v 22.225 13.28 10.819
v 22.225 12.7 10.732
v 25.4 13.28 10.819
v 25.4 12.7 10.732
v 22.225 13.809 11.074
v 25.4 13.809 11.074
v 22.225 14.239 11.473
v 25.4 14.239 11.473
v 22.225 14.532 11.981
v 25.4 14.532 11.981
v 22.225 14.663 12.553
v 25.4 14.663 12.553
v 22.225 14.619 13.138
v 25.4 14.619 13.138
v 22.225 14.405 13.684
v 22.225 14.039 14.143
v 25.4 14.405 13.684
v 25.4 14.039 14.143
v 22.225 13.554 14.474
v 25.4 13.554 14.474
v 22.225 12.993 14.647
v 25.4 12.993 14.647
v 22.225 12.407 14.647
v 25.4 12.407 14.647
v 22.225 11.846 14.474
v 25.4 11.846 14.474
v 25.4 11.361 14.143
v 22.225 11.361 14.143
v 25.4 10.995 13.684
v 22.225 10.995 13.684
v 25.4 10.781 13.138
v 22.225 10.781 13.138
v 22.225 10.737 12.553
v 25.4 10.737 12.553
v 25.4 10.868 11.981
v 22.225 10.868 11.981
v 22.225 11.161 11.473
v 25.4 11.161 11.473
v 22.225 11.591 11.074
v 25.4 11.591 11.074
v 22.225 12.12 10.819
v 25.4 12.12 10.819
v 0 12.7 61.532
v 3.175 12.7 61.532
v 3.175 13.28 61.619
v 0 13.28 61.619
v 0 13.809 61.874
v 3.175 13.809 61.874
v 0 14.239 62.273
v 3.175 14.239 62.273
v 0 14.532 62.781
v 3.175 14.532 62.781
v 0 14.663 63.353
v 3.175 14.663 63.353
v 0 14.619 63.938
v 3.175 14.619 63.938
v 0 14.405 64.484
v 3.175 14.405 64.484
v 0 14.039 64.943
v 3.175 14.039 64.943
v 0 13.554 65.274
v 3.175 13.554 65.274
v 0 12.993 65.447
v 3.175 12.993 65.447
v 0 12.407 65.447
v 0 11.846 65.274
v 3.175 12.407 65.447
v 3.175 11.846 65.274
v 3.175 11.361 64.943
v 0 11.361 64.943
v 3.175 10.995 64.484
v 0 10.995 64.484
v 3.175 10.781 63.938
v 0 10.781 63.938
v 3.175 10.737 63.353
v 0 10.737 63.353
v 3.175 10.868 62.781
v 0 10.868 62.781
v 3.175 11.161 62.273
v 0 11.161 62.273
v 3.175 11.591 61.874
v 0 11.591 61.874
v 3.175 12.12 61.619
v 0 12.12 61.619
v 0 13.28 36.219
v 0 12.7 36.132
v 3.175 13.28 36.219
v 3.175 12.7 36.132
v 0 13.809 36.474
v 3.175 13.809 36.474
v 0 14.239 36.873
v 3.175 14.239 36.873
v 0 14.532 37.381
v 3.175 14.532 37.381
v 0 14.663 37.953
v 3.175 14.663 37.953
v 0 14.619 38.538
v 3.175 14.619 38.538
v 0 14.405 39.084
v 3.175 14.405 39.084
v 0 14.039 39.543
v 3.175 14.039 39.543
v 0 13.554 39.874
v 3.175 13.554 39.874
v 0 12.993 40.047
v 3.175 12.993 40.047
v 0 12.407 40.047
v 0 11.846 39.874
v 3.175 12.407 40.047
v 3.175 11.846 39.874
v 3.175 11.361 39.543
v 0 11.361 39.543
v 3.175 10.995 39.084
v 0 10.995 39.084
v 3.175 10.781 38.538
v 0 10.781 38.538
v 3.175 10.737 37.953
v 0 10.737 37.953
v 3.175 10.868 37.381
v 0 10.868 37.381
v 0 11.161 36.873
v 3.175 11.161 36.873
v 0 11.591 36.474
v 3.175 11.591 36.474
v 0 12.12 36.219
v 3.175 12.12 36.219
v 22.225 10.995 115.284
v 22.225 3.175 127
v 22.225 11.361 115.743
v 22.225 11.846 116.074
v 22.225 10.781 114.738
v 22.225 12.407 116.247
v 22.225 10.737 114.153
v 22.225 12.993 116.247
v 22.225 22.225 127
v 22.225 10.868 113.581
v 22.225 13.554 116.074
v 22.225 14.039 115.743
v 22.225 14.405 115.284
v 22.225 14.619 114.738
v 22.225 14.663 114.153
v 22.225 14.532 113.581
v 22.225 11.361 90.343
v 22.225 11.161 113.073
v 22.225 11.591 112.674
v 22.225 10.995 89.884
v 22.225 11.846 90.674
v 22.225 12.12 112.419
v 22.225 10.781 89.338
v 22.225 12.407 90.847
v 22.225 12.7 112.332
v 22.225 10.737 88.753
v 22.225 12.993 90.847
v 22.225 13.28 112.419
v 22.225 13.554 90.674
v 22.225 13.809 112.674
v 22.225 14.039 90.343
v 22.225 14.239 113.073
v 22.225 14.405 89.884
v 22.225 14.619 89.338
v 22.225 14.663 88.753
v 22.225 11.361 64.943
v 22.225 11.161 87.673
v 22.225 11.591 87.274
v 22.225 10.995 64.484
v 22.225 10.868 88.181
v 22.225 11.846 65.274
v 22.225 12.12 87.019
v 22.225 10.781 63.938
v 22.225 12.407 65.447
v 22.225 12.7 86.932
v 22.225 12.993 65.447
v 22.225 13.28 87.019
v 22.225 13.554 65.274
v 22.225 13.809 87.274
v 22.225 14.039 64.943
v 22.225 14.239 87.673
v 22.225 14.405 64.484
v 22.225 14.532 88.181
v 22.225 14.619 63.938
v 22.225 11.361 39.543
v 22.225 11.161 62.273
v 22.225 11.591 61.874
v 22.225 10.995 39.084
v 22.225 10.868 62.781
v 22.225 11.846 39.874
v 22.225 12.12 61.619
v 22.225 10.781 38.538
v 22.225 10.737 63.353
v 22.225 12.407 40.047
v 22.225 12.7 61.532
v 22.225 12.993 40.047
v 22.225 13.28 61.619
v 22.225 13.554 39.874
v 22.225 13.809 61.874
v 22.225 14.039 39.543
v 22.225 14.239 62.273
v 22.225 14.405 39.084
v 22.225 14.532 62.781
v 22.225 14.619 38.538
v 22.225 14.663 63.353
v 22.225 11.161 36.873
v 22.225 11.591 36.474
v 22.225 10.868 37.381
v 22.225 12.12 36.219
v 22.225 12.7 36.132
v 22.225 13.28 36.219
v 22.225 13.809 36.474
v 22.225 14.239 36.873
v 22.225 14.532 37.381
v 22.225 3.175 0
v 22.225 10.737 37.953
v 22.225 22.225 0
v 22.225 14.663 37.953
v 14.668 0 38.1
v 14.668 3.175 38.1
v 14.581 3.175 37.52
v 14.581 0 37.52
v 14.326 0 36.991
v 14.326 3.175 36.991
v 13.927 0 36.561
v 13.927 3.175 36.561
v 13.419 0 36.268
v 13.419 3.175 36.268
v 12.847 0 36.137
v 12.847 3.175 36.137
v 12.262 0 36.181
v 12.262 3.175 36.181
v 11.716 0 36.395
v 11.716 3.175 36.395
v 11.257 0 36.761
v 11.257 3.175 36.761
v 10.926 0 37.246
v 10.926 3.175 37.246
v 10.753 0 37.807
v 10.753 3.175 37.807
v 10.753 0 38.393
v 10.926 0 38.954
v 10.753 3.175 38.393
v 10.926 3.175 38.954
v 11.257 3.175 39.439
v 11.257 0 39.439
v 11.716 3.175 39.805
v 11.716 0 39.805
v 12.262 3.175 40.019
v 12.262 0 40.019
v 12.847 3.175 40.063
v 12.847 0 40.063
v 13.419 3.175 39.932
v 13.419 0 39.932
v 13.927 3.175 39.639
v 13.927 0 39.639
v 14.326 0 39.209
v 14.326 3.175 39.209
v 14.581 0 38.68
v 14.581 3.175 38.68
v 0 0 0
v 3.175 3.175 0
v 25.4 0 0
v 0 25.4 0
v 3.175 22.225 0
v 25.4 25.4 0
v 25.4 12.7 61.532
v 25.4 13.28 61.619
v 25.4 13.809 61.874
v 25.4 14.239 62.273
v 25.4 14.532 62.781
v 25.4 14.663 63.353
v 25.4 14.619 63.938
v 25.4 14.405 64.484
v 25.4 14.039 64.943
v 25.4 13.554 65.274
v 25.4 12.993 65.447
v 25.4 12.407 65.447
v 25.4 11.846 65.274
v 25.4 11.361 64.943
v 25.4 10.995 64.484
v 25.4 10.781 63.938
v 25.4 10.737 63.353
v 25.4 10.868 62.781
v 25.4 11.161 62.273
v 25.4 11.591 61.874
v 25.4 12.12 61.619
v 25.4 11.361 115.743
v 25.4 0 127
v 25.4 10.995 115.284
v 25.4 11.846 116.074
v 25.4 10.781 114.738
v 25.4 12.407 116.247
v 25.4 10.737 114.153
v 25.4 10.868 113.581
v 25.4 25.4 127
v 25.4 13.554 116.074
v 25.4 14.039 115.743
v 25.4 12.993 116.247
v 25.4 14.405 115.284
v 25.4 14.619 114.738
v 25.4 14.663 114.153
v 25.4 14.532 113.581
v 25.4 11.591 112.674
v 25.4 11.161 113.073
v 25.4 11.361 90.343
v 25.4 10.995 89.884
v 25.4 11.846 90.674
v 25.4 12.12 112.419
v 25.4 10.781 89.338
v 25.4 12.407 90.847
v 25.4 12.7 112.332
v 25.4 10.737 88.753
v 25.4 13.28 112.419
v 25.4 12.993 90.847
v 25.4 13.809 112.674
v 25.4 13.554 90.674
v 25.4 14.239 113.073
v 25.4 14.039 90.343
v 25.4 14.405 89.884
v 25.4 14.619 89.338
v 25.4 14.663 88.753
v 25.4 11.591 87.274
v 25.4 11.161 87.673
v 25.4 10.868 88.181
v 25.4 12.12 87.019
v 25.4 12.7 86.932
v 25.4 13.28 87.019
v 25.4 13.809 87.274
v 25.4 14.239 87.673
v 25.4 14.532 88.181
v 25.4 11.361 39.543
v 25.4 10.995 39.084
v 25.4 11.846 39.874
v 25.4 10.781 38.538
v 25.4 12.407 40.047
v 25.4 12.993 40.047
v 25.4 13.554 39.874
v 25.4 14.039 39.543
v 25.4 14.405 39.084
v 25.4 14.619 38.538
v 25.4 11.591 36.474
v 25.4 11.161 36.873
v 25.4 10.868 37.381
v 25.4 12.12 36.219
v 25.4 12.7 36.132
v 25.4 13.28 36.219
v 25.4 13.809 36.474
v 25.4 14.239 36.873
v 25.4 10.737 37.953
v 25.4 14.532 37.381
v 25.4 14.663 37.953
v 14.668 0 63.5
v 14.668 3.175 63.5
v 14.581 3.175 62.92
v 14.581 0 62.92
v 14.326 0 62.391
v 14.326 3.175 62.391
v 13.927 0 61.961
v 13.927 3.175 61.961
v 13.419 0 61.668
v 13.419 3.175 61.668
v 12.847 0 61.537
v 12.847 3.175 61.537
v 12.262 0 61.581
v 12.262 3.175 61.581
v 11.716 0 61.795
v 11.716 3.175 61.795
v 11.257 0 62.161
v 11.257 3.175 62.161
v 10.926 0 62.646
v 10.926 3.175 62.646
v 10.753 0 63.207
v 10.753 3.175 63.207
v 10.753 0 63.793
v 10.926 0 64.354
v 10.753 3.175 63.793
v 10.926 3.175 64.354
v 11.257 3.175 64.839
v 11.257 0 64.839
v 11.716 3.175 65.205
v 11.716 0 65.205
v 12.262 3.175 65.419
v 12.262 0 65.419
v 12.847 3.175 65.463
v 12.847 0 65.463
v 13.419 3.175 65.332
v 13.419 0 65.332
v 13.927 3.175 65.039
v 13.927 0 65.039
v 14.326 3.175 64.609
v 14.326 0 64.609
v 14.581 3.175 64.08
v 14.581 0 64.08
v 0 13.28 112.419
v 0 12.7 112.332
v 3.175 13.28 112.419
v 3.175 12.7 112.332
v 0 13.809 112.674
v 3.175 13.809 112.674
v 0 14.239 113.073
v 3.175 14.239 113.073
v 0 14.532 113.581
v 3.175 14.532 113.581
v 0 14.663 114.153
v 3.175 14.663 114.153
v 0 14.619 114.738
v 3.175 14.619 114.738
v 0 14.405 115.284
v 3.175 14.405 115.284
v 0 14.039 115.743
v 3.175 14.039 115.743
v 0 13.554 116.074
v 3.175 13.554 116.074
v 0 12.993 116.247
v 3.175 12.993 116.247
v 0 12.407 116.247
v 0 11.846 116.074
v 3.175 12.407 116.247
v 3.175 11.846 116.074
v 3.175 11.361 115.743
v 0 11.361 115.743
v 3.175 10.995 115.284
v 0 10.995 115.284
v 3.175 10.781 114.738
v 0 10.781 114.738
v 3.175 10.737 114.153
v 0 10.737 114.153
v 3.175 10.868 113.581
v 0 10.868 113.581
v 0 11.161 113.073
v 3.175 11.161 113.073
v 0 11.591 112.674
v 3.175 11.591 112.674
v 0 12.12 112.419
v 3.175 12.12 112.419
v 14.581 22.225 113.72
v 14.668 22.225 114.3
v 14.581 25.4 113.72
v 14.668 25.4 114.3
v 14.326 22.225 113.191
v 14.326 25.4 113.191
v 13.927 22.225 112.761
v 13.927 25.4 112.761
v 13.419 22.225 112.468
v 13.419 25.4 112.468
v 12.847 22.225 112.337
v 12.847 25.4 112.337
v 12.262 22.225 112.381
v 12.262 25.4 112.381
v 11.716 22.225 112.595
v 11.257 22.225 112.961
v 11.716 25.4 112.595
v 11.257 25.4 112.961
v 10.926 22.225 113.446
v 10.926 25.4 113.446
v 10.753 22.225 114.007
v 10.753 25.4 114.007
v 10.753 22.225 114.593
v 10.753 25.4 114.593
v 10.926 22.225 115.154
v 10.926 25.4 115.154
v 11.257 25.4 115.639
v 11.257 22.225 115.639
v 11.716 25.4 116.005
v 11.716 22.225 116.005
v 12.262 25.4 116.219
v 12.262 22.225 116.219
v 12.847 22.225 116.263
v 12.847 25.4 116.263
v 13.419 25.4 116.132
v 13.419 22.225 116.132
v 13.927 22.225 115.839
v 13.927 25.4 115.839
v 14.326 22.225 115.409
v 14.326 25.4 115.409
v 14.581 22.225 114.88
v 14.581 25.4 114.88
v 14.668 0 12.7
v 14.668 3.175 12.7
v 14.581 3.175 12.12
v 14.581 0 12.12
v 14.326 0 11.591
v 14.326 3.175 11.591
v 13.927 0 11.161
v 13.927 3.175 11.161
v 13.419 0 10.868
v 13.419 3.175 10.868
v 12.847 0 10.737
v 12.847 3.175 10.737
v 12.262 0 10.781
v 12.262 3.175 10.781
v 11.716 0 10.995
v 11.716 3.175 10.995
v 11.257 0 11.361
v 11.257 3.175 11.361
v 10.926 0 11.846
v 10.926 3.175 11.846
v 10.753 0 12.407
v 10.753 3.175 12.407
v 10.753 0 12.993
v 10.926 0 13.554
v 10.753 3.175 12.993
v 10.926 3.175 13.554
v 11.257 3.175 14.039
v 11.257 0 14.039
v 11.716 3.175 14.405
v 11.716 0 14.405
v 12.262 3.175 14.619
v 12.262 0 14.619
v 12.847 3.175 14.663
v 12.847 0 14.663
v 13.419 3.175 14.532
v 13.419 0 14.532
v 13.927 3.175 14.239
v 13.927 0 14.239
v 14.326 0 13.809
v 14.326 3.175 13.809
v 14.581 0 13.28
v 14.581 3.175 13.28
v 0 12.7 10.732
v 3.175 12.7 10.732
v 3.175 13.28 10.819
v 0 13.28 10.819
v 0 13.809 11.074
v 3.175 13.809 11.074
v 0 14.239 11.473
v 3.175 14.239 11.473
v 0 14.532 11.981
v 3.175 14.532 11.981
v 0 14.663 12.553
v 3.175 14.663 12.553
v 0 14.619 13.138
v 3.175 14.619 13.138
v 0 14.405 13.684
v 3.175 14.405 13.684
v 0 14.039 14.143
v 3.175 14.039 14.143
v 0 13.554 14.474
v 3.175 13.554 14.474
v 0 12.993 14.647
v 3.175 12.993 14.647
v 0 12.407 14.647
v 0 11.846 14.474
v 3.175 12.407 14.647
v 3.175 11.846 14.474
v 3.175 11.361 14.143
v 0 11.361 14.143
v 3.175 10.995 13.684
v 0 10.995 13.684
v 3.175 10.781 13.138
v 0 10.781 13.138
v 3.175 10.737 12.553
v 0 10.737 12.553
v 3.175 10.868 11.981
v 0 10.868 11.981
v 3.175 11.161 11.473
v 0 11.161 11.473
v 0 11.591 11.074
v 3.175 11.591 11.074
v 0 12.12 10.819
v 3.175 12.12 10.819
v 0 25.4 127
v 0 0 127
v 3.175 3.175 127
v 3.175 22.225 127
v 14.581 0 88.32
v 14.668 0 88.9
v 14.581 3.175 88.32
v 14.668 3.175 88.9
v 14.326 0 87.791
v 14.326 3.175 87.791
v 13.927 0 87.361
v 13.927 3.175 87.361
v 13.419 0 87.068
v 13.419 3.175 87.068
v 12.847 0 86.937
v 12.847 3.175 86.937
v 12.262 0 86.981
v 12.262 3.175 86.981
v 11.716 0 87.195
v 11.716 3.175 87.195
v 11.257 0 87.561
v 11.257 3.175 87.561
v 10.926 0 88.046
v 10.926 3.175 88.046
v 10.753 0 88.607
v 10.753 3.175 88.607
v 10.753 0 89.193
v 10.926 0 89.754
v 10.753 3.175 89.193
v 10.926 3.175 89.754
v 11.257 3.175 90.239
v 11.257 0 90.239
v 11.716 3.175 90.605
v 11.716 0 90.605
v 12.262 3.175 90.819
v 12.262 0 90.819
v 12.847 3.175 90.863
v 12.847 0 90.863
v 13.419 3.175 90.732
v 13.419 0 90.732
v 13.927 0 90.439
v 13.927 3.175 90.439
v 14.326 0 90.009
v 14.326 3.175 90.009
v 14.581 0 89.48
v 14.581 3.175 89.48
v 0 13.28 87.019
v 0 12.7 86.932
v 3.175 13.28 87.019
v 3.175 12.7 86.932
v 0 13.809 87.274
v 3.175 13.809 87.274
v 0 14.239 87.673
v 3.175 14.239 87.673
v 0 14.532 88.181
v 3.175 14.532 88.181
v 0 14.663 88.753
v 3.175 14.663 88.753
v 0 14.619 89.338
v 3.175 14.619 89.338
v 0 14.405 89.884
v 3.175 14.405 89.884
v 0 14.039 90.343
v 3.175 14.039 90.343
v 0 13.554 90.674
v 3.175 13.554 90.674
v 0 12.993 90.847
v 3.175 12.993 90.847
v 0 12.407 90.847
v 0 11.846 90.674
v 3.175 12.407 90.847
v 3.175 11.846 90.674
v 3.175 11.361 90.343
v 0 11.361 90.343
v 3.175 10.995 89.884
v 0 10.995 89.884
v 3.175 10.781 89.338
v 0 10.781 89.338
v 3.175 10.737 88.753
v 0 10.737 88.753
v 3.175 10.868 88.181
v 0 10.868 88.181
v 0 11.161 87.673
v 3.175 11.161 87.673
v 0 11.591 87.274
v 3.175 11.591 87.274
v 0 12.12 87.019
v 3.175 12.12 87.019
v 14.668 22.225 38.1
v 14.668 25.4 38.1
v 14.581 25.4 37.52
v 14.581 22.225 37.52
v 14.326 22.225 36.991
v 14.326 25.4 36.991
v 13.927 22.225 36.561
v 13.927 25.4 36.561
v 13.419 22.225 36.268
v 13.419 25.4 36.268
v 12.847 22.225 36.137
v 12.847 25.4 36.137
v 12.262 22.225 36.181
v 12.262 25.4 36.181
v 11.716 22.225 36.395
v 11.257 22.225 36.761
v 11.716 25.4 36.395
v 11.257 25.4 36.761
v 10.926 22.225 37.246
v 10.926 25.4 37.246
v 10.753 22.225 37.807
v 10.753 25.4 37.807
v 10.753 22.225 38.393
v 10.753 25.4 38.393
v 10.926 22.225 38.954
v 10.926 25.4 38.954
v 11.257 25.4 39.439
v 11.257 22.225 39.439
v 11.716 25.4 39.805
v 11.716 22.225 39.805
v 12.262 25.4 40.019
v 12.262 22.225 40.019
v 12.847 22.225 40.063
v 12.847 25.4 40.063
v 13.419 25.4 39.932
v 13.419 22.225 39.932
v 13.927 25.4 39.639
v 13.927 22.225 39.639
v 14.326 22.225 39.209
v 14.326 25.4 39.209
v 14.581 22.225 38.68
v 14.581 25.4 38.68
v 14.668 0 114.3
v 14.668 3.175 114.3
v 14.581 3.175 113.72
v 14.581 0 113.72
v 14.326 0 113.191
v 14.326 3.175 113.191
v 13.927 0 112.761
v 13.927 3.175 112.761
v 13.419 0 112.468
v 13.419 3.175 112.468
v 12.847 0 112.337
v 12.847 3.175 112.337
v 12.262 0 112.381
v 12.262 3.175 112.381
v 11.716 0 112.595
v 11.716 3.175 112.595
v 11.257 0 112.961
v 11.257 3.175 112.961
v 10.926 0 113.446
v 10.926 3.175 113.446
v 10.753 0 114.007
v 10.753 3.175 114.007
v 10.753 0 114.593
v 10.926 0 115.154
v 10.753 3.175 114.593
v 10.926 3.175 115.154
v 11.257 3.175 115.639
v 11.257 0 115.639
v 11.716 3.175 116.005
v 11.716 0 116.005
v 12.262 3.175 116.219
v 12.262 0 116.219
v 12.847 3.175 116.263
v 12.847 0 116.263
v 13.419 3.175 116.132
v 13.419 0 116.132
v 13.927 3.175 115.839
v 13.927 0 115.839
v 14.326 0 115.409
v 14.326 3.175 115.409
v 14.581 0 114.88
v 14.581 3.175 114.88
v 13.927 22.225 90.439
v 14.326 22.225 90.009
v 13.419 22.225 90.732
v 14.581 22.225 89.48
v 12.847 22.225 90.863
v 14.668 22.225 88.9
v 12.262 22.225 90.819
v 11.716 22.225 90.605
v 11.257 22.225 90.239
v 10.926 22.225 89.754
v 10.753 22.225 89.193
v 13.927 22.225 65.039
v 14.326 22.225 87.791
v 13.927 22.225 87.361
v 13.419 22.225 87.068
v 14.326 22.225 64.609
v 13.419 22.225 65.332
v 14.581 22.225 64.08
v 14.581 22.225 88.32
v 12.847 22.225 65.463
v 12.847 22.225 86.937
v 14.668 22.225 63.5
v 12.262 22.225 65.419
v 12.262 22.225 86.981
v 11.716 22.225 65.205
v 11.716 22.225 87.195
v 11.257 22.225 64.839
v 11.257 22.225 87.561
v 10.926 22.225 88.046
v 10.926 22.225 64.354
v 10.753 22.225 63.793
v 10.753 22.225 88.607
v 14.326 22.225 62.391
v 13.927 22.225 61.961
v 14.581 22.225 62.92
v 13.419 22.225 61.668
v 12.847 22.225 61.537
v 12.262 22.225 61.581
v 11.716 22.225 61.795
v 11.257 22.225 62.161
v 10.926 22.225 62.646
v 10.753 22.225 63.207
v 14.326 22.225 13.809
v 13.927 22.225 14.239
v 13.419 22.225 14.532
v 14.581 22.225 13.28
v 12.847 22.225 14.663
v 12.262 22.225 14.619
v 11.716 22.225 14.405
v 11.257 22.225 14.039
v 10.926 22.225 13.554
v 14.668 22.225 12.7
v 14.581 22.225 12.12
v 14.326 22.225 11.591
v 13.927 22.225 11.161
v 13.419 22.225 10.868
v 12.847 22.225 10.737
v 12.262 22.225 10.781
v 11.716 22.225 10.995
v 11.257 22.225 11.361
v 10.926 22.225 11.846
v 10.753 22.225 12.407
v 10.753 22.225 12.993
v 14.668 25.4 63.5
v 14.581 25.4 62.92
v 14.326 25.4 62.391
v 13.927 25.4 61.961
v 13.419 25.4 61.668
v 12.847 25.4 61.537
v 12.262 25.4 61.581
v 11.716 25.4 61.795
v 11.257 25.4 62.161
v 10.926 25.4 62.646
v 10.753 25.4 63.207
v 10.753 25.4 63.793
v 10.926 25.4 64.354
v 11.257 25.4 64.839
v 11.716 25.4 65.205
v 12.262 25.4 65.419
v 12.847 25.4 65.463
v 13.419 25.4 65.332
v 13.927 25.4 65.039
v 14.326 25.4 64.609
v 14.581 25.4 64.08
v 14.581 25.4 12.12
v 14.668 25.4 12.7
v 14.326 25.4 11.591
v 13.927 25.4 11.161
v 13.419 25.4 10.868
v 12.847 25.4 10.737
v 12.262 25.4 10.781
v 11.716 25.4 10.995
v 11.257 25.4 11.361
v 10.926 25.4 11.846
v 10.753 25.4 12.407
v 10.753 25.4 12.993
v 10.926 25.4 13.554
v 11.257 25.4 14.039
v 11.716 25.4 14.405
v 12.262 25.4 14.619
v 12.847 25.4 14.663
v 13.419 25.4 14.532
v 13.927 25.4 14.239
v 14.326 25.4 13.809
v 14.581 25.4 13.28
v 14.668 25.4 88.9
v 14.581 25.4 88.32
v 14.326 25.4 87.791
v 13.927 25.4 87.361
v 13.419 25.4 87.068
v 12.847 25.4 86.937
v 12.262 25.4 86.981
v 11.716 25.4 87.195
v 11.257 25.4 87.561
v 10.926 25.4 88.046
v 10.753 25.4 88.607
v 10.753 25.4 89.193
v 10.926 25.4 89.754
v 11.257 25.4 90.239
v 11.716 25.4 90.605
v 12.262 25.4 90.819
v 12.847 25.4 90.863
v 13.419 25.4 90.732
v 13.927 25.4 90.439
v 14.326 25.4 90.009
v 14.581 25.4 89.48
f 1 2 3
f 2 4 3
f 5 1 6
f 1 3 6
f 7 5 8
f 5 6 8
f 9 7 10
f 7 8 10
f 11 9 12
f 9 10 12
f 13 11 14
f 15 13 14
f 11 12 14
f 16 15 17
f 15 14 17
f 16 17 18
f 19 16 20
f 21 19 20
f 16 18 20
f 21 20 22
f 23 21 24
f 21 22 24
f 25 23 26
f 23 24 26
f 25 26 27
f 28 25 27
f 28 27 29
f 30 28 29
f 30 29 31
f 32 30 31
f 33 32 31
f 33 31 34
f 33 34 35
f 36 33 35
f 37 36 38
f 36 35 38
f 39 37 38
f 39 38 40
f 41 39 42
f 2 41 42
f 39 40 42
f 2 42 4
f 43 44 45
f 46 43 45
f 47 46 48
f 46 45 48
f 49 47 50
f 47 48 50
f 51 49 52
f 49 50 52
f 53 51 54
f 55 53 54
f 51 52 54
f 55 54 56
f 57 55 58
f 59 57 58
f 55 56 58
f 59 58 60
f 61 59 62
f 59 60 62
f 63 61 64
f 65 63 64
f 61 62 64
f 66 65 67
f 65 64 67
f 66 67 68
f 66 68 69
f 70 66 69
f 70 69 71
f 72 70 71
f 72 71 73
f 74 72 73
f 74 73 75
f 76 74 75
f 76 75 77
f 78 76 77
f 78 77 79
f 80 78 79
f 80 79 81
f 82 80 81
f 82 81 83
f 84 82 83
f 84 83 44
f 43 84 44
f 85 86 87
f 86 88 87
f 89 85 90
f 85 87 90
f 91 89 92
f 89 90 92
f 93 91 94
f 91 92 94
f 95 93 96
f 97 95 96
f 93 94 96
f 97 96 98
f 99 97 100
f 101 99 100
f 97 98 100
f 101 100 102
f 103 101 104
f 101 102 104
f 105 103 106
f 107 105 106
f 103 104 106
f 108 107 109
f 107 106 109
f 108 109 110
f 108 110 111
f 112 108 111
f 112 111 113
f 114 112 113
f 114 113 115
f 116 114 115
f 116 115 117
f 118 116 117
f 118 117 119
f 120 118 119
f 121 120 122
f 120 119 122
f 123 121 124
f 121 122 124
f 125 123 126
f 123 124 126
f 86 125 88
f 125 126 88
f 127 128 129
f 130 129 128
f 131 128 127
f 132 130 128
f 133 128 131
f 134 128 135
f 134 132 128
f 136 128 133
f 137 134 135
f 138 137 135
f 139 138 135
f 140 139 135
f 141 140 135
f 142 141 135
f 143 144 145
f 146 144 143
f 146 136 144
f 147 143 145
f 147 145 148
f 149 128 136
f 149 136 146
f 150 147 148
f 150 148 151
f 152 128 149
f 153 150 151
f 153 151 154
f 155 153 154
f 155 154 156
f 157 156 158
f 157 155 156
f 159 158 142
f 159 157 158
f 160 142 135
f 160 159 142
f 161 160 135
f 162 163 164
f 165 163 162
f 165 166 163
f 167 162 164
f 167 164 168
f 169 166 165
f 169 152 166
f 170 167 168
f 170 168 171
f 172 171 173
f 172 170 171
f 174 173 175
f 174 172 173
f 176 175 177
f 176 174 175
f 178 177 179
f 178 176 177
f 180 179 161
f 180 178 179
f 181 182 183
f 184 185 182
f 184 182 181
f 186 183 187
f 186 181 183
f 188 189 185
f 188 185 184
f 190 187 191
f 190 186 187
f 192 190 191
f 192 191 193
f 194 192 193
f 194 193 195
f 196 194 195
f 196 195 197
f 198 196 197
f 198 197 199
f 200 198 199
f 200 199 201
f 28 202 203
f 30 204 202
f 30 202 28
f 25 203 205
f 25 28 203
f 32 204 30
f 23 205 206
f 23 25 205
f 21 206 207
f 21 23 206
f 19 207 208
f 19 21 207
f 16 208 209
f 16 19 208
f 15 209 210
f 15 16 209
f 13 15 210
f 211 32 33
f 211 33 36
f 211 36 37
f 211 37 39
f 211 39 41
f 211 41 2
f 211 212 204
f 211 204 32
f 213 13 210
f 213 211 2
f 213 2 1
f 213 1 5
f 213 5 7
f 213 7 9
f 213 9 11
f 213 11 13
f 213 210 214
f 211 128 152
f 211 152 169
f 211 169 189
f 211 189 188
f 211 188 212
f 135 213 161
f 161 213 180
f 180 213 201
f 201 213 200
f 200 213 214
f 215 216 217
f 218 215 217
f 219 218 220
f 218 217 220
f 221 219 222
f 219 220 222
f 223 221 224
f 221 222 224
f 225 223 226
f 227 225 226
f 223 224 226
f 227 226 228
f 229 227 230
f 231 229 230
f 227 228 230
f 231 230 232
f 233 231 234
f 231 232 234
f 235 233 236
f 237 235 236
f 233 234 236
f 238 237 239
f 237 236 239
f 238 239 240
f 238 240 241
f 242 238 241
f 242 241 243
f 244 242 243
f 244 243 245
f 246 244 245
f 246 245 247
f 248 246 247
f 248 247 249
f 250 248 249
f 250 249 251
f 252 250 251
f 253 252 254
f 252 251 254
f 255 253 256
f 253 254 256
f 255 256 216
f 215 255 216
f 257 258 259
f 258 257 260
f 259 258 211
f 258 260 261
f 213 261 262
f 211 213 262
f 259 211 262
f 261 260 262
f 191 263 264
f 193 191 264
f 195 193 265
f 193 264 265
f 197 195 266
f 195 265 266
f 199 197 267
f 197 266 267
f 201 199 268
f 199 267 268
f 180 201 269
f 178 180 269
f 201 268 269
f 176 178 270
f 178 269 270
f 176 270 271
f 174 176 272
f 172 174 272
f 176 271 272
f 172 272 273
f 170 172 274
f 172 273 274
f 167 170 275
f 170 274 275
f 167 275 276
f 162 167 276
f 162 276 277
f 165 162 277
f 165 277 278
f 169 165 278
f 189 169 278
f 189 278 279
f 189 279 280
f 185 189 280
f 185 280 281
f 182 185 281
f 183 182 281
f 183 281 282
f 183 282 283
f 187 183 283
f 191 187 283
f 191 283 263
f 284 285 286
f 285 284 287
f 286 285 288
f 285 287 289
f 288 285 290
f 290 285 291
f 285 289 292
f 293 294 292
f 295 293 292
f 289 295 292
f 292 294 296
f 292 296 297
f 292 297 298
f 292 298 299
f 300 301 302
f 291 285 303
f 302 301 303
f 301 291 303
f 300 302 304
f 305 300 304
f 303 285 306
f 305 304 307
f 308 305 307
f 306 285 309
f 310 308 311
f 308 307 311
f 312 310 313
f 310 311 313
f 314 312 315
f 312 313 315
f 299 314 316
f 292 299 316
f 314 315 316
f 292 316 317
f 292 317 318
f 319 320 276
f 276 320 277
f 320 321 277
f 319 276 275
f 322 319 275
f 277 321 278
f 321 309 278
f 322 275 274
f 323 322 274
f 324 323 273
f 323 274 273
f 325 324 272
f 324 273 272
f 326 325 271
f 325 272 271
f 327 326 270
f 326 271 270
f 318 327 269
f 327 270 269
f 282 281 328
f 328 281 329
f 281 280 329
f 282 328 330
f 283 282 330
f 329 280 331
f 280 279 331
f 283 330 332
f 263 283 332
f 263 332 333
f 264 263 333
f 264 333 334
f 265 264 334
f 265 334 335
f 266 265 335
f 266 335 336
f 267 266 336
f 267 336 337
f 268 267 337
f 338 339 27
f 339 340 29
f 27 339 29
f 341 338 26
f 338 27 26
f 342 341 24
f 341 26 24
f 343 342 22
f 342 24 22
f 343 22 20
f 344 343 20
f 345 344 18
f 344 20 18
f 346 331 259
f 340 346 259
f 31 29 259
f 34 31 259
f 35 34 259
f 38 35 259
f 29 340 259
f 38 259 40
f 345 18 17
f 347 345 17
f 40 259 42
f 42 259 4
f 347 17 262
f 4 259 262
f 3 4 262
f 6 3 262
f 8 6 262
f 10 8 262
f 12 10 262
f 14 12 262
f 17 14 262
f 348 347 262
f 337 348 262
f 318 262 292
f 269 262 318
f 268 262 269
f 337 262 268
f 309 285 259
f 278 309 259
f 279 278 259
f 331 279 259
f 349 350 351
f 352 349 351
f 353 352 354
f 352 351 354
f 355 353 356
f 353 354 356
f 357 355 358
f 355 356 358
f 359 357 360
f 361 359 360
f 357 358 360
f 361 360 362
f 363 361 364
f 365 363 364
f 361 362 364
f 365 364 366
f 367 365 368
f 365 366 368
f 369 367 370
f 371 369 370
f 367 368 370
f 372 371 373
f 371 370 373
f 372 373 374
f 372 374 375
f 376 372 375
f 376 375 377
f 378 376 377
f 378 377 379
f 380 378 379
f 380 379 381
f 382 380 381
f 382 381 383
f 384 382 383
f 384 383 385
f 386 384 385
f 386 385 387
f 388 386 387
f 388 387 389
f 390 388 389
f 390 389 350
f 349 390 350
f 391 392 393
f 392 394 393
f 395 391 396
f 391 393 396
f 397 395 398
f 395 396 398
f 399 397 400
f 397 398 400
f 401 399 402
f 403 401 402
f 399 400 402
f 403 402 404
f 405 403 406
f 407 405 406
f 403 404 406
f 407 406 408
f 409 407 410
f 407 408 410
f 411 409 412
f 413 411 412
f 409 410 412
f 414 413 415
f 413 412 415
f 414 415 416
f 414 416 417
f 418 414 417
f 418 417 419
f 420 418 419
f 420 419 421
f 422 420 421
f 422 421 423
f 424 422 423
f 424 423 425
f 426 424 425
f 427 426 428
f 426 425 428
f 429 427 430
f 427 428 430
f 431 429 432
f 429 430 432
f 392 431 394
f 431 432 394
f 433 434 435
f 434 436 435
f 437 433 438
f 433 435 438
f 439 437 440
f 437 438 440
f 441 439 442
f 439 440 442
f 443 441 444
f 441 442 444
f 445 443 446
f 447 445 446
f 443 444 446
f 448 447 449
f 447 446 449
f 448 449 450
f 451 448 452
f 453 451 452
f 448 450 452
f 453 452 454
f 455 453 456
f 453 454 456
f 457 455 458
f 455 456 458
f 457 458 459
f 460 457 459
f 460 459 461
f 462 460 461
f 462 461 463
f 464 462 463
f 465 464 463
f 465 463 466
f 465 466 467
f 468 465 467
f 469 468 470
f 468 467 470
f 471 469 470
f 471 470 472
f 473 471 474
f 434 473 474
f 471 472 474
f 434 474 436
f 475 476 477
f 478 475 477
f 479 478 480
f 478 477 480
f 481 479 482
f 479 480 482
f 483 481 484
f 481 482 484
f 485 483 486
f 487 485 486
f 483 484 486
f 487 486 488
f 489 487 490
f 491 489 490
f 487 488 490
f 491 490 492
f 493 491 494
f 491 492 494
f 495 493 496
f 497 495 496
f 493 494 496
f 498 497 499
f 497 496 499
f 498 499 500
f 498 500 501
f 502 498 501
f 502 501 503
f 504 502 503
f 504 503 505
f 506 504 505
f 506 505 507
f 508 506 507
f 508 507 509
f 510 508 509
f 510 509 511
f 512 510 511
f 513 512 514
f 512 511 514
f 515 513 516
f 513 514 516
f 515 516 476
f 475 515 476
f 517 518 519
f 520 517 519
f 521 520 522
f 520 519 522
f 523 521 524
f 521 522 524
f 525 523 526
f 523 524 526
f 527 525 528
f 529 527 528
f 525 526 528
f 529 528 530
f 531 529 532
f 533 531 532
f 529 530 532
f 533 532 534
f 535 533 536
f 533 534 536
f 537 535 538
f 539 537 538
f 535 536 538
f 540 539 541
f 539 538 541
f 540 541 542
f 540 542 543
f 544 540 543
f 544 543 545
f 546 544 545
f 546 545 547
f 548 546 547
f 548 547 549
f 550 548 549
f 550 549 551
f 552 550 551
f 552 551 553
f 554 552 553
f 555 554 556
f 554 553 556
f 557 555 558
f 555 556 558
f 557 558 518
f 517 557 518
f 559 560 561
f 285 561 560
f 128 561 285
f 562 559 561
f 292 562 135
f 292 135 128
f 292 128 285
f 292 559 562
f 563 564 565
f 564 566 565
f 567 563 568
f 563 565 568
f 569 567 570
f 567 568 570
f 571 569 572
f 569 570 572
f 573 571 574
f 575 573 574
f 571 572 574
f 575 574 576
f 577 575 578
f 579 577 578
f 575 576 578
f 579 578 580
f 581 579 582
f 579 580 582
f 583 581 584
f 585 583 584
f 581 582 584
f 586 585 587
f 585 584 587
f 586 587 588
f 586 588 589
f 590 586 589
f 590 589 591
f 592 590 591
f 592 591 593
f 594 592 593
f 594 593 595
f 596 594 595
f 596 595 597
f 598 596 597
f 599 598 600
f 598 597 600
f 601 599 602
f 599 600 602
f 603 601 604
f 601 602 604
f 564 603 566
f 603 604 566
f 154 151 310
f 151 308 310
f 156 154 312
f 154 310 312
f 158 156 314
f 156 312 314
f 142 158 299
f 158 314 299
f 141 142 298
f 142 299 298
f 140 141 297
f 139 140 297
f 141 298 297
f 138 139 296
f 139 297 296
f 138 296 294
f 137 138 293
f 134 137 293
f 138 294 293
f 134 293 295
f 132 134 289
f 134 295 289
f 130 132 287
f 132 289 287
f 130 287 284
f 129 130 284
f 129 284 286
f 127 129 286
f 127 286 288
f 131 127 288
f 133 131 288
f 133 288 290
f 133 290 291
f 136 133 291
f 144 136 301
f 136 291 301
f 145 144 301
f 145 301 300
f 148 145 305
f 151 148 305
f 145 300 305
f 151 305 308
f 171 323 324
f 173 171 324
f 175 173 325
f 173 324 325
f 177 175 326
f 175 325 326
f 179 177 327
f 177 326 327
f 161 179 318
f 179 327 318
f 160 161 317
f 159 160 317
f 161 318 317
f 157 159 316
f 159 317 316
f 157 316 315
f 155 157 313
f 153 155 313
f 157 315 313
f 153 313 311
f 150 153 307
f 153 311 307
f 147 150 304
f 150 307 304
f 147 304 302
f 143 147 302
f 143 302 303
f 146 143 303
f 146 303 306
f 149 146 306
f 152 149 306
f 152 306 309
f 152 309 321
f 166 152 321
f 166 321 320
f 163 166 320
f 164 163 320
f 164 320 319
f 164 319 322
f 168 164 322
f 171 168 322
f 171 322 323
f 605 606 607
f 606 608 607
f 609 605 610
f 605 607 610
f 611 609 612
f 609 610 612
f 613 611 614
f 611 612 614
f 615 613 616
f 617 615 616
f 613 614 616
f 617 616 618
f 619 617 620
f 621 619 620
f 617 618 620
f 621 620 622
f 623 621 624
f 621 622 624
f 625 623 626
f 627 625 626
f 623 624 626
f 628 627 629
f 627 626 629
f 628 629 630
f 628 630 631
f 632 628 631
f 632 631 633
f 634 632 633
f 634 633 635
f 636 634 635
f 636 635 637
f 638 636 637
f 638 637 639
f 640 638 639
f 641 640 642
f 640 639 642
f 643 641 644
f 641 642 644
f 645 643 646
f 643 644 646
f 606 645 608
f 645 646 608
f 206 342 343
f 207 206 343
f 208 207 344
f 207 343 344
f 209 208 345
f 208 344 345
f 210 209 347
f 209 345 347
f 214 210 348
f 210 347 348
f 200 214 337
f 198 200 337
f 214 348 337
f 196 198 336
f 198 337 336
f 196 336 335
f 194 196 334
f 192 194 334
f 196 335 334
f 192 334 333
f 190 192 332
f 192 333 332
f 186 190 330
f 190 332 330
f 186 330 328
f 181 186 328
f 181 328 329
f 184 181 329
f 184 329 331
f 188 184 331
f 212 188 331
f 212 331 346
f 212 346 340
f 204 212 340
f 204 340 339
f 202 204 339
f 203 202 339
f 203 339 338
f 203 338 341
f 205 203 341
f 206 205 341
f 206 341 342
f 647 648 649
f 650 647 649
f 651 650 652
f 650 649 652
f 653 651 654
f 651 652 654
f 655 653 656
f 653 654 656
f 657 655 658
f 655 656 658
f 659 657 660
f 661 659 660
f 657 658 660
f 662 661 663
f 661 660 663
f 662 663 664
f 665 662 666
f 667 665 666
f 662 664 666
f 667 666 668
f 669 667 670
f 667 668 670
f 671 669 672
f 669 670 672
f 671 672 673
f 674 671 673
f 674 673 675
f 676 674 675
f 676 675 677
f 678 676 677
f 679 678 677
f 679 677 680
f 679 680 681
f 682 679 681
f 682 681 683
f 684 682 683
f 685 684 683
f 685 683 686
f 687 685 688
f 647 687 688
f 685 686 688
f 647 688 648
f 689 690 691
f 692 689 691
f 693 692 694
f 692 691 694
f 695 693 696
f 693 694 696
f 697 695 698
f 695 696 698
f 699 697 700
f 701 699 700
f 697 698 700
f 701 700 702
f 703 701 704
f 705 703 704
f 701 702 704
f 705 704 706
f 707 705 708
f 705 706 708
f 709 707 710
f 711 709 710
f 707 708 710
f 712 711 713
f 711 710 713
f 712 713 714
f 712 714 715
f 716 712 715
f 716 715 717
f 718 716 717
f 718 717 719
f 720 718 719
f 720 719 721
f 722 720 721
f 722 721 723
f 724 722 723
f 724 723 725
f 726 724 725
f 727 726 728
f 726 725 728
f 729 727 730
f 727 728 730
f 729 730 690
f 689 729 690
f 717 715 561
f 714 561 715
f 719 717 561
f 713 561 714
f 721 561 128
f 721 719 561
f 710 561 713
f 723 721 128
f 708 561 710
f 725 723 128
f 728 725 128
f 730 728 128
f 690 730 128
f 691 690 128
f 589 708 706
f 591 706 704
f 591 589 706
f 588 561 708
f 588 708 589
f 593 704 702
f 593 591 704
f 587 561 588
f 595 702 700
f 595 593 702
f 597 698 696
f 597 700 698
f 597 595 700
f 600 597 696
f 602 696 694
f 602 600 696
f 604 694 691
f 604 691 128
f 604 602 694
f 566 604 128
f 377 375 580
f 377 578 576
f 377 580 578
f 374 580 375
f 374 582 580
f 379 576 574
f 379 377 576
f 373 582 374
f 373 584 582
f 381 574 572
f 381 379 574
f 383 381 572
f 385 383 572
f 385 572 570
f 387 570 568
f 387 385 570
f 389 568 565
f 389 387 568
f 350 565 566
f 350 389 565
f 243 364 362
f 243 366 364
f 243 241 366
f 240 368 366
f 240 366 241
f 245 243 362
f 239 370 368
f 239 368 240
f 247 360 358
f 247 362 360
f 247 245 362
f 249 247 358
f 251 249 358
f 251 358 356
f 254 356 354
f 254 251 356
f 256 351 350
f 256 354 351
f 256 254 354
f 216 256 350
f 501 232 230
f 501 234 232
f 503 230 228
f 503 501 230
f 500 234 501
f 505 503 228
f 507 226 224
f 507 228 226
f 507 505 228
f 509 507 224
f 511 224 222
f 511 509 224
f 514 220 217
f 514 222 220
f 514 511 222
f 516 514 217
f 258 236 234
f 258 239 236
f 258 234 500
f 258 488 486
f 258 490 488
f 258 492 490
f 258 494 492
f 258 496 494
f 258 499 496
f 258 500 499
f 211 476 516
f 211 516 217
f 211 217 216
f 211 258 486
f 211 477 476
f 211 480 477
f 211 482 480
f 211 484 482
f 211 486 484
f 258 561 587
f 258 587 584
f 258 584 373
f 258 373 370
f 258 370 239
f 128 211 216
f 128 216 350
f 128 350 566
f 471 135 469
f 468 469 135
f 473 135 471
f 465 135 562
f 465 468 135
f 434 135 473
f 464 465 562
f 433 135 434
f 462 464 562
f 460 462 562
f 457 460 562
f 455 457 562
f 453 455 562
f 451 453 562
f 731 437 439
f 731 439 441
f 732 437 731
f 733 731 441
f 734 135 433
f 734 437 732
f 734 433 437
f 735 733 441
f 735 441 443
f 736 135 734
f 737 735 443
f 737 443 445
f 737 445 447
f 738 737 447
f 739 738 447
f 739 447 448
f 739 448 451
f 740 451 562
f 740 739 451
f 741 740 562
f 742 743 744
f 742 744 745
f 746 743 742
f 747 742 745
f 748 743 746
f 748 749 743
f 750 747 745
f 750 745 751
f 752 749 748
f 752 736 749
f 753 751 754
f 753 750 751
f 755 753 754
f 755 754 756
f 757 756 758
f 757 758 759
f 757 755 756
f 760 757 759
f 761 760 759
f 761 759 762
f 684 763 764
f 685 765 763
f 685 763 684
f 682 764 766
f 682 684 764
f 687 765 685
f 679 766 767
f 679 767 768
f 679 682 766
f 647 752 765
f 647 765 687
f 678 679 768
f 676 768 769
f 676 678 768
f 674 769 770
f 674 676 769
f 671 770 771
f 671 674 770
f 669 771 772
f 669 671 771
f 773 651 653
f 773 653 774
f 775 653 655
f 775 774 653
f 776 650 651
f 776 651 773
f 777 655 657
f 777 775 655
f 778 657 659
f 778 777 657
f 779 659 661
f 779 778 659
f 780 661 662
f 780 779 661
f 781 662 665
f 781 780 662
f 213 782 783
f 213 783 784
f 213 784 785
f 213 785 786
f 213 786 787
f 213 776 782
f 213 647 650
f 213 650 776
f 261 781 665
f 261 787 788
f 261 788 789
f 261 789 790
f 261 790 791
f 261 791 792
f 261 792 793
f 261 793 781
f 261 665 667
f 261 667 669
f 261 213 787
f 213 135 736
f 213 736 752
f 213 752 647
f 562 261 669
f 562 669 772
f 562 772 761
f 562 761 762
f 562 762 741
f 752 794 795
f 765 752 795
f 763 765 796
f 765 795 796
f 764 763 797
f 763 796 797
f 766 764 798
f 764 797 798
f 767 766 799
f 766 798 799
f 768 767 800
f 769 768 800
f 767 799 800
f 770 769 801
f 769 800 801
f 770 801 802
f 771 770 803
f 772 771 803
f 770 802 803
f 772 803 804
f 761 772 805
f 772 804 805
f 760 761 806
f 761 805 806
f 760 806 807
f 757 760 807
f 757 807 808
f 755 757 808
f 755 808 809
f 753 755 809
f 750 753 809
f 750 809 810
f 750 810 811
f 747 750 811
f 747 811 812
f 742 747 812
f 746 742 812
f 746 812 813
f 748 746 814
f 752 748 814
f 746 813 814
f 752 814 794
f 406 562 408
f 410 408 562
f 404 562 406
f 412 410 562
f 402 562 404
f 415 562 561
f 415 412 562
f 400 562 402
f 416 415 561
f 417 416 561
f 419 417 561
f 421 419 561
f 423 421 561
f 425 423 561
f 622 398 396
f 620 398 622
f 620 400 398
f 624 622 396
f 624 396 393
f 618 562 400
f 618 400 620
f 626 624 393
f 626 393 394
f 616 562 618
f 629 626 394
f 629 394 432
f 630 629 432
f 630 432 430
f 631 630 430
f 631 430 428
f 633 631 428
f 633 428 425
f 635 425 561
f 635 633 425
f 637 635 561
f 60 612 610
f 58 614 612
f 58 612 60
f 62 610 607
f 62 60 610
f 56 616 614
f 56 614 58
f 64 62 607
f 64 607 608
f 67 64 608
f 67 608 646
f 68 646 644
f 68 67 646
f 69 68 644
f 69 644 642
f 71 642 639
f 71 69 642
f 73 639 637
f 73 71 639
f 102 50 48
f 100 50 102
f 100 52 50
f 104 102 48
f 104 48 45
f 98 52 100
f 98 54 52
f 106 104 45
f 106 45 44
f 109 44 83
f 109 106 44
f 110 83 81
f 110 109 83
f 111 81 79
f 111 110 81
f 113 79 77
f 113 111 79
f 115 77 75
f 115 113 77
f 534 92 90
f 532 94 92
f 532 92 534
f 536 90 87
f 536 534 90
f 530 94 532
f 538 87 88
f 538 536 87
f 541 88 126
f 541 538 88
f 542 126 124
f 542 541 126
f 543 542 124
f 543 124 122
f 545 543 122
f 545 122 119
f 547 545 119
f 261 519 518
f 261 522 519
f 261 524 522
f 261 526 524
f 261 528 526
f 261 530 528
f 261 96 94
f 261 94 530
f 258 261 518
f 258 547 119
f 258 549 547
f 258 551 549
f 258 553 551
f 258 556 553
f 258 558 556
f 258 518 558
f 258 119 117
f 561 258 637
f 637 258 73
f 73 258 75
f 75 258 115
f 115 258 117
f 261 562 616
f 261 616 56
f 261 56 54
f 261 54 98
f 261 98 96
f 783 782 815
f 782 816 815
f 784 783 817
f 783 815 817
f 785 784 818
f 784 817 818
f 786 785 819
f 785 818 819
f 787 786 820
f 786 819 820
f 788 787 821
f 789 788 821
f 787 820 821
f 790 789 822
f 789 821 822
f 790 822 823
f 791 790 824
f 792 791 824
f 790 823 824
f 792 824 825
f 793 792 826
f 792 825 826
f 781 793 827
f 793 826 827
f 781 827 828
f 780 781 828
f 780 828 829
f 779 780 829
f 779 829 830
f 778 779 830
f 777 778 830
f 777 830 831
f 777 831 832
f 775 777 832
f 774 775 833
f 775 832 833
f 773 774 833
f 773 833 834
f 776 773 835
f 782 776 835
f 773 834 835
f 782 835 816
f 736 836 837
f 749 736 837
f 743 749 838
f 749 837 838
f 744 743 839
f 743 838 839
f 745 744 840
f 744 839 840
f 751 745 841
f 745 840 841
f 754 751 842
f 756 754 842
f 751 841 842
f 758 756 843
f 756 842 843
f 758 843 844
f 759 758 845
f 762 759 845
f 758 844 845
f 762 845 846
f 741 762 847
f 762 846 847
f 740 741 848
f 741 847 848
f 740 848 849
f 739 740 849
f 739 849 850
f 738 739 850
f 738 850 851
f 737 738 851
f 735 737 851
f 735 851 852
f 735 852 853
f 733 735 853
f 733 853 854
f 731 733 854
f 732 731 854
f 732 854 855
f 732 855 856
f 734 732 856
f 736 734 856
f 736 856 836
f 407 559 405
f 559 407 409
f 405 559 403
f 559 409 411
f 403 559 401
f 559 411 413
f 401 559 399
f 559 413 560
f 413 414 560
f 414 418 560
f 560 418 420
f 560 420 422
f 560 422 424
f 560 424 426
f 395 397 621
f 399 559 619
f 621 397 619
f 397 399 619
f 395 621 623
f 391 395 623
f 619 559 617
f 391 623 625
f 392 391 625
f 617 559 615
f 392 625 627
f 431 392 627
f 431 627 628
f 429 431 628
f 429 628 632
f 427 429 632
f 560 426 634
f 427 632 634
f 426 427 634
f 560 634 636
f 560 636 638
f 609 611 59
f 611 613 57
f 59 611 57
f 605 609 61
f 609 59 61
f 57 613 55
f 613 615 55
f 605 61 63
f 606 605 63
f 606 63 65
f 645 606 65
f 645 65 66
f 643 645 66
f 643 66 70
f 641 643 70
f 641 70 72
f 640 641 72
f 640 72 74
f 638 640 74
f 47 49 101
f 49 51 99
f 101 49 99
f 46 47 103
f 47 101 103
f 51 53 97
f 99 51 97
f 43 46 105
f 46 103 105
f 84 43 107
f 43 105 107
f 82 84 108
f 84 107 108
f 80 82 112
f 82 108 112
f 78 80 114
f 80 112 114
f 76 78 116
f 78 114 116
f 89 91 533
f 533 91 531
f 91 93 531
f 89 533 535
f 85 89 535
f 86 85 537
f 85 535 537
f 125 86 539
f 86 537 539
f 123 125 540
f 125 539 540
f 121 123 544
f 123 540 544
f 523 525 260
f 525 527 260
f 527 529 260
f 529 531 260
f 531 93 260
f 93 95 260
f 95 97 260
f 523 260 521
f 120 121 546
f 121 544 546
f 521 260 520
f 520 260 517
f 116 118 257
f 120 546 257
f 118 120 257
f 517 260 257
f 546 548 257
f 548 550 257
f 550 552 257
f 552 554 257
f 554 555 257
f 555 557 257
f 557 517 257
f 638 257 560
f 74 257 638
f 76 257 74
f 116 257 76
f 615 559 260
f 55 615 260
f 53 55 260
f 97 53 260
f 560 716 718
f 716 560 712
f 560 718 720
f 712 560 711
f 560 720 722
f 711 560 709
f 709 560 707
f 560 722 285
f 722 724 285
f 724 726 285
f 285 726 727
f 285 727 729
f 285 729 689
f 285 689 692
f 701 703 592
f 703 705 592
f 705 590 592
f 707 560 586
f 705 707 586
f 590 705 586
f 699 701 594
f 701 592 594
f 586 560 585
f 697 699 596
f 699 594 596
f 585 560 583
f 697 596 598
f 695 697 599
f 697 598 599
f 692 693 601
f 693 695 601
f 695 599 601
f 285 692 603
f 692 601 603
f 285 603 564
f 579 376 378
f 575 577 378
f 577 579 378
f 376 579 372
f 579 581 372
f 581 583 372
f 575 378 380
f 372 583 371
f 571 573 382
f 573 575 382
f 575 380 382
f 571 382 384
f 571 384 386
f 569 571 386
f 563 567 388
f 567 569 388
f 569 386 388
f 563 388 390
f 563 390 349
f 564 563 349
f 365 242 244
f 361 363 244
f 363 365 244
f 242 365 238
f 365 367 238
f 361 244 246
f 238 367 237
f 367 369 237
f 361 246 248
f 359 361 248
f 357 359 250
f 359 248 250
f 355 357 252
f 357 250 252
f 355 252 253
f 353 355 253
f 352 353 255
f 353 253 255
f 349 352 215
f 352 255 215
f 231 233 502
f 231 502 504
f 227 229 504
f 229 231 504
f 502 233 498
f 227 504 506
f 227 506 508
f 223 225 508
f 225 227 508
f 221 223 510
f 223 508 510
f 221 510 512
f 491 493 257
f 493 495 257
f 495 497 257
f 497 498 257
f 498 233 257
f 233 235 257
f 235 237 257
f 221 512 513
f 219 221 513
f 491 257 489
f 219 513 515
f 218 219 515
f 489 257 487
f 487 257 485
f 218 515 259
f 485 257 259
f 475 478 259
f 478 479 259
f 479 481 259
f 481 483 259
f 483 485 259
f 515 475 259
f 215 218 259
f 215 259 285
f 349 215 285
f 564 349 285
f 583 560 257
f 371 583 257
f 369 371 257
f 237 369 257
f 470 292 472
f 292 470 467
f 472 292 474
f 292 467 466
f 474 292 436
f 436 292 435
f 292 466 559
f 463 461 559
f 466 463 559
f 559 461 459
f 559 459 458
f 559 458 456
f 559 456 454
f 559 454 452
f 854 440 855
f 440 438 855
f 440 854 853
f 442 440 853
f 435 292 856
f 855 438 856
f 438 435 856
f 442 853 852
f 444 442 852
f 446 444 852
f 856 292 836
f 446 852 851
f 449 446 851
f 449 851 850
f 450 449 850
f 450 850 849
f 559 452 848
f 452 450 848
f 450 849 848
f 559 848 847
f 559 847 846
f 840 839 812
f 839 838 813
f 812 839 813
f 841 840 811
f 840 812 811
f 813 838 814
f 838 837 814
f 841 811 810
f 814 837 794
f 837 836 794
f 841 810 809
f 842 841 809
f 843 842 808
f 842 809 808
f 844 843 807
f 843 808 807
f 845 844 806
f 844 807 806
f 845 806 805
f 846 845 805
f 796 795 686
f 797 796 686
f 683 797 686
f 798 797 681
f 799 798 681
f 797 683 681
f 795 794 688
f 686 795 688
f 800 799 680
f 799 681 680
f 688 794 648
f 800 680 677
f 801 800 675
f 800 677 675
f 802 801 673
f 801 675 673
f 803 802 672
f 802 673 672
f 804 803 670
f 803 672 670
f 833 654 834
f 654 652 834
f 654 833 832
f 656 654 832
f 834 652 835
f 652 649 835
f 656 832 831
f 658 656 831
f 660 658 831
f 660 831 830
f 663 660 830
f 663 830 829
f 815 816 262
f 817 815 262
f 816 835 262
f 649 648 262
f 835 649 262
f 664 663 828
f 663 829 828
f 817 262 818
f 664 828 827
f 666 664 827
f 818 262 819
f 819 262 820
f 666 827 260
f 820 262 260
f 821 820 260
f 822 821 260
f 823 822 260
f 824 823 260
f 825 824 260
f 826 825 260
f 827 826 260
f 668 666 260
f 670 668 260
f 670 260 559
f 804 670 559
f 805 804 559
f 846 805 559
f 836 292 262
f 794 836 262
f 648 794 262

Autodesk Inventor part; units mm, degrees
ref_plane "YZ Plane" through (0, 0, 0) normal (1, 0, 0) x (0, 1, 0)
ref_plane "XZ Plane" through (0, 0, 0) normal (0, 1, 0) x (-1, 0, 0)
ref_plane "XY Plane" through (0, 0, 0) normal (0, 0, 1) x (1, 0, 0)
sketch "Sketch1" plane through (0, 0, 0) normal (0, 0, 1) x (1, 0, 0)
  line L0 (0, 0) -> (25.4, 0)
  line L1 (25.4, 0) -> (25.4, 25.4)
  line L2 (25.4, 25.4) -> (0, 25.4)
  line L3 (0, 25.4) -> (0, 0)
  dimension "d0" = 25.4
  dimension "d1" = 25.4
extrude "Extrusion1" add sketch "Sketch1" along normal blind 127
shell "Shell1" thickness 3.175 removed faces 2 at (8.4667, 16.9333, 0) at (8.4667, 16.9333, 127)
sketch "Sketch2" plane through (0, 25.4, 0) normal (0, 1, 0) x (1, 0, 0)
  circle A0 centre (12.7, -12.7) radius 1.9685
  line L0 (0, 0) -> (0, -127) projected
  line L1 (25.4, 0) -> (0, 0) projected
  circle A1 centre (12.7, -38.1) radius 1.9685
  circle A2 centre (12.7, -63.5) radius 1.9685
  circle A3 centre (12.7, -88.9) radius 1.9685
  circle A4 centre (12.7, -114.3) radius 1.9685
  dimension "d5" = 3.937
  dimension "d6" = 12.7
  dimension "d7" = 12.7
  dimension "d10" = 25.4
extrude "Extrusion2" cut sketch "Sketch2" against normal blind 127
sketch "Sketch3" plane through (25.4, 0, 0) normal (1, 0, 0) x (0, 0, -1)
  circle A0 centre (-12.7, 12.7) radius 1.9685
  line L0 (0, 25.4) -> (-127, 25.4) projected
  line L1 (0, 0) -> (0, 25.4) projected
  circle A1 centre (-38.1, 12.7) radius 1.9685
  circle A2 centre (-63.5, 12.7) radius 1.9685
  circle A3 centre (-88.9, 12.7) radius 1.9685
  circle A4 centre (-114.3, 12.7) radius 1.9685
  dimension "d17" = 3.937
  dimension "d18" = 12.7
  dimension "d19" = 12.7
  dimension "d22" = 25.4
extrude "Extrusion3" cut sketch "Sketch3" against normal blind 127
properties part number "Kermit Frame 12"
